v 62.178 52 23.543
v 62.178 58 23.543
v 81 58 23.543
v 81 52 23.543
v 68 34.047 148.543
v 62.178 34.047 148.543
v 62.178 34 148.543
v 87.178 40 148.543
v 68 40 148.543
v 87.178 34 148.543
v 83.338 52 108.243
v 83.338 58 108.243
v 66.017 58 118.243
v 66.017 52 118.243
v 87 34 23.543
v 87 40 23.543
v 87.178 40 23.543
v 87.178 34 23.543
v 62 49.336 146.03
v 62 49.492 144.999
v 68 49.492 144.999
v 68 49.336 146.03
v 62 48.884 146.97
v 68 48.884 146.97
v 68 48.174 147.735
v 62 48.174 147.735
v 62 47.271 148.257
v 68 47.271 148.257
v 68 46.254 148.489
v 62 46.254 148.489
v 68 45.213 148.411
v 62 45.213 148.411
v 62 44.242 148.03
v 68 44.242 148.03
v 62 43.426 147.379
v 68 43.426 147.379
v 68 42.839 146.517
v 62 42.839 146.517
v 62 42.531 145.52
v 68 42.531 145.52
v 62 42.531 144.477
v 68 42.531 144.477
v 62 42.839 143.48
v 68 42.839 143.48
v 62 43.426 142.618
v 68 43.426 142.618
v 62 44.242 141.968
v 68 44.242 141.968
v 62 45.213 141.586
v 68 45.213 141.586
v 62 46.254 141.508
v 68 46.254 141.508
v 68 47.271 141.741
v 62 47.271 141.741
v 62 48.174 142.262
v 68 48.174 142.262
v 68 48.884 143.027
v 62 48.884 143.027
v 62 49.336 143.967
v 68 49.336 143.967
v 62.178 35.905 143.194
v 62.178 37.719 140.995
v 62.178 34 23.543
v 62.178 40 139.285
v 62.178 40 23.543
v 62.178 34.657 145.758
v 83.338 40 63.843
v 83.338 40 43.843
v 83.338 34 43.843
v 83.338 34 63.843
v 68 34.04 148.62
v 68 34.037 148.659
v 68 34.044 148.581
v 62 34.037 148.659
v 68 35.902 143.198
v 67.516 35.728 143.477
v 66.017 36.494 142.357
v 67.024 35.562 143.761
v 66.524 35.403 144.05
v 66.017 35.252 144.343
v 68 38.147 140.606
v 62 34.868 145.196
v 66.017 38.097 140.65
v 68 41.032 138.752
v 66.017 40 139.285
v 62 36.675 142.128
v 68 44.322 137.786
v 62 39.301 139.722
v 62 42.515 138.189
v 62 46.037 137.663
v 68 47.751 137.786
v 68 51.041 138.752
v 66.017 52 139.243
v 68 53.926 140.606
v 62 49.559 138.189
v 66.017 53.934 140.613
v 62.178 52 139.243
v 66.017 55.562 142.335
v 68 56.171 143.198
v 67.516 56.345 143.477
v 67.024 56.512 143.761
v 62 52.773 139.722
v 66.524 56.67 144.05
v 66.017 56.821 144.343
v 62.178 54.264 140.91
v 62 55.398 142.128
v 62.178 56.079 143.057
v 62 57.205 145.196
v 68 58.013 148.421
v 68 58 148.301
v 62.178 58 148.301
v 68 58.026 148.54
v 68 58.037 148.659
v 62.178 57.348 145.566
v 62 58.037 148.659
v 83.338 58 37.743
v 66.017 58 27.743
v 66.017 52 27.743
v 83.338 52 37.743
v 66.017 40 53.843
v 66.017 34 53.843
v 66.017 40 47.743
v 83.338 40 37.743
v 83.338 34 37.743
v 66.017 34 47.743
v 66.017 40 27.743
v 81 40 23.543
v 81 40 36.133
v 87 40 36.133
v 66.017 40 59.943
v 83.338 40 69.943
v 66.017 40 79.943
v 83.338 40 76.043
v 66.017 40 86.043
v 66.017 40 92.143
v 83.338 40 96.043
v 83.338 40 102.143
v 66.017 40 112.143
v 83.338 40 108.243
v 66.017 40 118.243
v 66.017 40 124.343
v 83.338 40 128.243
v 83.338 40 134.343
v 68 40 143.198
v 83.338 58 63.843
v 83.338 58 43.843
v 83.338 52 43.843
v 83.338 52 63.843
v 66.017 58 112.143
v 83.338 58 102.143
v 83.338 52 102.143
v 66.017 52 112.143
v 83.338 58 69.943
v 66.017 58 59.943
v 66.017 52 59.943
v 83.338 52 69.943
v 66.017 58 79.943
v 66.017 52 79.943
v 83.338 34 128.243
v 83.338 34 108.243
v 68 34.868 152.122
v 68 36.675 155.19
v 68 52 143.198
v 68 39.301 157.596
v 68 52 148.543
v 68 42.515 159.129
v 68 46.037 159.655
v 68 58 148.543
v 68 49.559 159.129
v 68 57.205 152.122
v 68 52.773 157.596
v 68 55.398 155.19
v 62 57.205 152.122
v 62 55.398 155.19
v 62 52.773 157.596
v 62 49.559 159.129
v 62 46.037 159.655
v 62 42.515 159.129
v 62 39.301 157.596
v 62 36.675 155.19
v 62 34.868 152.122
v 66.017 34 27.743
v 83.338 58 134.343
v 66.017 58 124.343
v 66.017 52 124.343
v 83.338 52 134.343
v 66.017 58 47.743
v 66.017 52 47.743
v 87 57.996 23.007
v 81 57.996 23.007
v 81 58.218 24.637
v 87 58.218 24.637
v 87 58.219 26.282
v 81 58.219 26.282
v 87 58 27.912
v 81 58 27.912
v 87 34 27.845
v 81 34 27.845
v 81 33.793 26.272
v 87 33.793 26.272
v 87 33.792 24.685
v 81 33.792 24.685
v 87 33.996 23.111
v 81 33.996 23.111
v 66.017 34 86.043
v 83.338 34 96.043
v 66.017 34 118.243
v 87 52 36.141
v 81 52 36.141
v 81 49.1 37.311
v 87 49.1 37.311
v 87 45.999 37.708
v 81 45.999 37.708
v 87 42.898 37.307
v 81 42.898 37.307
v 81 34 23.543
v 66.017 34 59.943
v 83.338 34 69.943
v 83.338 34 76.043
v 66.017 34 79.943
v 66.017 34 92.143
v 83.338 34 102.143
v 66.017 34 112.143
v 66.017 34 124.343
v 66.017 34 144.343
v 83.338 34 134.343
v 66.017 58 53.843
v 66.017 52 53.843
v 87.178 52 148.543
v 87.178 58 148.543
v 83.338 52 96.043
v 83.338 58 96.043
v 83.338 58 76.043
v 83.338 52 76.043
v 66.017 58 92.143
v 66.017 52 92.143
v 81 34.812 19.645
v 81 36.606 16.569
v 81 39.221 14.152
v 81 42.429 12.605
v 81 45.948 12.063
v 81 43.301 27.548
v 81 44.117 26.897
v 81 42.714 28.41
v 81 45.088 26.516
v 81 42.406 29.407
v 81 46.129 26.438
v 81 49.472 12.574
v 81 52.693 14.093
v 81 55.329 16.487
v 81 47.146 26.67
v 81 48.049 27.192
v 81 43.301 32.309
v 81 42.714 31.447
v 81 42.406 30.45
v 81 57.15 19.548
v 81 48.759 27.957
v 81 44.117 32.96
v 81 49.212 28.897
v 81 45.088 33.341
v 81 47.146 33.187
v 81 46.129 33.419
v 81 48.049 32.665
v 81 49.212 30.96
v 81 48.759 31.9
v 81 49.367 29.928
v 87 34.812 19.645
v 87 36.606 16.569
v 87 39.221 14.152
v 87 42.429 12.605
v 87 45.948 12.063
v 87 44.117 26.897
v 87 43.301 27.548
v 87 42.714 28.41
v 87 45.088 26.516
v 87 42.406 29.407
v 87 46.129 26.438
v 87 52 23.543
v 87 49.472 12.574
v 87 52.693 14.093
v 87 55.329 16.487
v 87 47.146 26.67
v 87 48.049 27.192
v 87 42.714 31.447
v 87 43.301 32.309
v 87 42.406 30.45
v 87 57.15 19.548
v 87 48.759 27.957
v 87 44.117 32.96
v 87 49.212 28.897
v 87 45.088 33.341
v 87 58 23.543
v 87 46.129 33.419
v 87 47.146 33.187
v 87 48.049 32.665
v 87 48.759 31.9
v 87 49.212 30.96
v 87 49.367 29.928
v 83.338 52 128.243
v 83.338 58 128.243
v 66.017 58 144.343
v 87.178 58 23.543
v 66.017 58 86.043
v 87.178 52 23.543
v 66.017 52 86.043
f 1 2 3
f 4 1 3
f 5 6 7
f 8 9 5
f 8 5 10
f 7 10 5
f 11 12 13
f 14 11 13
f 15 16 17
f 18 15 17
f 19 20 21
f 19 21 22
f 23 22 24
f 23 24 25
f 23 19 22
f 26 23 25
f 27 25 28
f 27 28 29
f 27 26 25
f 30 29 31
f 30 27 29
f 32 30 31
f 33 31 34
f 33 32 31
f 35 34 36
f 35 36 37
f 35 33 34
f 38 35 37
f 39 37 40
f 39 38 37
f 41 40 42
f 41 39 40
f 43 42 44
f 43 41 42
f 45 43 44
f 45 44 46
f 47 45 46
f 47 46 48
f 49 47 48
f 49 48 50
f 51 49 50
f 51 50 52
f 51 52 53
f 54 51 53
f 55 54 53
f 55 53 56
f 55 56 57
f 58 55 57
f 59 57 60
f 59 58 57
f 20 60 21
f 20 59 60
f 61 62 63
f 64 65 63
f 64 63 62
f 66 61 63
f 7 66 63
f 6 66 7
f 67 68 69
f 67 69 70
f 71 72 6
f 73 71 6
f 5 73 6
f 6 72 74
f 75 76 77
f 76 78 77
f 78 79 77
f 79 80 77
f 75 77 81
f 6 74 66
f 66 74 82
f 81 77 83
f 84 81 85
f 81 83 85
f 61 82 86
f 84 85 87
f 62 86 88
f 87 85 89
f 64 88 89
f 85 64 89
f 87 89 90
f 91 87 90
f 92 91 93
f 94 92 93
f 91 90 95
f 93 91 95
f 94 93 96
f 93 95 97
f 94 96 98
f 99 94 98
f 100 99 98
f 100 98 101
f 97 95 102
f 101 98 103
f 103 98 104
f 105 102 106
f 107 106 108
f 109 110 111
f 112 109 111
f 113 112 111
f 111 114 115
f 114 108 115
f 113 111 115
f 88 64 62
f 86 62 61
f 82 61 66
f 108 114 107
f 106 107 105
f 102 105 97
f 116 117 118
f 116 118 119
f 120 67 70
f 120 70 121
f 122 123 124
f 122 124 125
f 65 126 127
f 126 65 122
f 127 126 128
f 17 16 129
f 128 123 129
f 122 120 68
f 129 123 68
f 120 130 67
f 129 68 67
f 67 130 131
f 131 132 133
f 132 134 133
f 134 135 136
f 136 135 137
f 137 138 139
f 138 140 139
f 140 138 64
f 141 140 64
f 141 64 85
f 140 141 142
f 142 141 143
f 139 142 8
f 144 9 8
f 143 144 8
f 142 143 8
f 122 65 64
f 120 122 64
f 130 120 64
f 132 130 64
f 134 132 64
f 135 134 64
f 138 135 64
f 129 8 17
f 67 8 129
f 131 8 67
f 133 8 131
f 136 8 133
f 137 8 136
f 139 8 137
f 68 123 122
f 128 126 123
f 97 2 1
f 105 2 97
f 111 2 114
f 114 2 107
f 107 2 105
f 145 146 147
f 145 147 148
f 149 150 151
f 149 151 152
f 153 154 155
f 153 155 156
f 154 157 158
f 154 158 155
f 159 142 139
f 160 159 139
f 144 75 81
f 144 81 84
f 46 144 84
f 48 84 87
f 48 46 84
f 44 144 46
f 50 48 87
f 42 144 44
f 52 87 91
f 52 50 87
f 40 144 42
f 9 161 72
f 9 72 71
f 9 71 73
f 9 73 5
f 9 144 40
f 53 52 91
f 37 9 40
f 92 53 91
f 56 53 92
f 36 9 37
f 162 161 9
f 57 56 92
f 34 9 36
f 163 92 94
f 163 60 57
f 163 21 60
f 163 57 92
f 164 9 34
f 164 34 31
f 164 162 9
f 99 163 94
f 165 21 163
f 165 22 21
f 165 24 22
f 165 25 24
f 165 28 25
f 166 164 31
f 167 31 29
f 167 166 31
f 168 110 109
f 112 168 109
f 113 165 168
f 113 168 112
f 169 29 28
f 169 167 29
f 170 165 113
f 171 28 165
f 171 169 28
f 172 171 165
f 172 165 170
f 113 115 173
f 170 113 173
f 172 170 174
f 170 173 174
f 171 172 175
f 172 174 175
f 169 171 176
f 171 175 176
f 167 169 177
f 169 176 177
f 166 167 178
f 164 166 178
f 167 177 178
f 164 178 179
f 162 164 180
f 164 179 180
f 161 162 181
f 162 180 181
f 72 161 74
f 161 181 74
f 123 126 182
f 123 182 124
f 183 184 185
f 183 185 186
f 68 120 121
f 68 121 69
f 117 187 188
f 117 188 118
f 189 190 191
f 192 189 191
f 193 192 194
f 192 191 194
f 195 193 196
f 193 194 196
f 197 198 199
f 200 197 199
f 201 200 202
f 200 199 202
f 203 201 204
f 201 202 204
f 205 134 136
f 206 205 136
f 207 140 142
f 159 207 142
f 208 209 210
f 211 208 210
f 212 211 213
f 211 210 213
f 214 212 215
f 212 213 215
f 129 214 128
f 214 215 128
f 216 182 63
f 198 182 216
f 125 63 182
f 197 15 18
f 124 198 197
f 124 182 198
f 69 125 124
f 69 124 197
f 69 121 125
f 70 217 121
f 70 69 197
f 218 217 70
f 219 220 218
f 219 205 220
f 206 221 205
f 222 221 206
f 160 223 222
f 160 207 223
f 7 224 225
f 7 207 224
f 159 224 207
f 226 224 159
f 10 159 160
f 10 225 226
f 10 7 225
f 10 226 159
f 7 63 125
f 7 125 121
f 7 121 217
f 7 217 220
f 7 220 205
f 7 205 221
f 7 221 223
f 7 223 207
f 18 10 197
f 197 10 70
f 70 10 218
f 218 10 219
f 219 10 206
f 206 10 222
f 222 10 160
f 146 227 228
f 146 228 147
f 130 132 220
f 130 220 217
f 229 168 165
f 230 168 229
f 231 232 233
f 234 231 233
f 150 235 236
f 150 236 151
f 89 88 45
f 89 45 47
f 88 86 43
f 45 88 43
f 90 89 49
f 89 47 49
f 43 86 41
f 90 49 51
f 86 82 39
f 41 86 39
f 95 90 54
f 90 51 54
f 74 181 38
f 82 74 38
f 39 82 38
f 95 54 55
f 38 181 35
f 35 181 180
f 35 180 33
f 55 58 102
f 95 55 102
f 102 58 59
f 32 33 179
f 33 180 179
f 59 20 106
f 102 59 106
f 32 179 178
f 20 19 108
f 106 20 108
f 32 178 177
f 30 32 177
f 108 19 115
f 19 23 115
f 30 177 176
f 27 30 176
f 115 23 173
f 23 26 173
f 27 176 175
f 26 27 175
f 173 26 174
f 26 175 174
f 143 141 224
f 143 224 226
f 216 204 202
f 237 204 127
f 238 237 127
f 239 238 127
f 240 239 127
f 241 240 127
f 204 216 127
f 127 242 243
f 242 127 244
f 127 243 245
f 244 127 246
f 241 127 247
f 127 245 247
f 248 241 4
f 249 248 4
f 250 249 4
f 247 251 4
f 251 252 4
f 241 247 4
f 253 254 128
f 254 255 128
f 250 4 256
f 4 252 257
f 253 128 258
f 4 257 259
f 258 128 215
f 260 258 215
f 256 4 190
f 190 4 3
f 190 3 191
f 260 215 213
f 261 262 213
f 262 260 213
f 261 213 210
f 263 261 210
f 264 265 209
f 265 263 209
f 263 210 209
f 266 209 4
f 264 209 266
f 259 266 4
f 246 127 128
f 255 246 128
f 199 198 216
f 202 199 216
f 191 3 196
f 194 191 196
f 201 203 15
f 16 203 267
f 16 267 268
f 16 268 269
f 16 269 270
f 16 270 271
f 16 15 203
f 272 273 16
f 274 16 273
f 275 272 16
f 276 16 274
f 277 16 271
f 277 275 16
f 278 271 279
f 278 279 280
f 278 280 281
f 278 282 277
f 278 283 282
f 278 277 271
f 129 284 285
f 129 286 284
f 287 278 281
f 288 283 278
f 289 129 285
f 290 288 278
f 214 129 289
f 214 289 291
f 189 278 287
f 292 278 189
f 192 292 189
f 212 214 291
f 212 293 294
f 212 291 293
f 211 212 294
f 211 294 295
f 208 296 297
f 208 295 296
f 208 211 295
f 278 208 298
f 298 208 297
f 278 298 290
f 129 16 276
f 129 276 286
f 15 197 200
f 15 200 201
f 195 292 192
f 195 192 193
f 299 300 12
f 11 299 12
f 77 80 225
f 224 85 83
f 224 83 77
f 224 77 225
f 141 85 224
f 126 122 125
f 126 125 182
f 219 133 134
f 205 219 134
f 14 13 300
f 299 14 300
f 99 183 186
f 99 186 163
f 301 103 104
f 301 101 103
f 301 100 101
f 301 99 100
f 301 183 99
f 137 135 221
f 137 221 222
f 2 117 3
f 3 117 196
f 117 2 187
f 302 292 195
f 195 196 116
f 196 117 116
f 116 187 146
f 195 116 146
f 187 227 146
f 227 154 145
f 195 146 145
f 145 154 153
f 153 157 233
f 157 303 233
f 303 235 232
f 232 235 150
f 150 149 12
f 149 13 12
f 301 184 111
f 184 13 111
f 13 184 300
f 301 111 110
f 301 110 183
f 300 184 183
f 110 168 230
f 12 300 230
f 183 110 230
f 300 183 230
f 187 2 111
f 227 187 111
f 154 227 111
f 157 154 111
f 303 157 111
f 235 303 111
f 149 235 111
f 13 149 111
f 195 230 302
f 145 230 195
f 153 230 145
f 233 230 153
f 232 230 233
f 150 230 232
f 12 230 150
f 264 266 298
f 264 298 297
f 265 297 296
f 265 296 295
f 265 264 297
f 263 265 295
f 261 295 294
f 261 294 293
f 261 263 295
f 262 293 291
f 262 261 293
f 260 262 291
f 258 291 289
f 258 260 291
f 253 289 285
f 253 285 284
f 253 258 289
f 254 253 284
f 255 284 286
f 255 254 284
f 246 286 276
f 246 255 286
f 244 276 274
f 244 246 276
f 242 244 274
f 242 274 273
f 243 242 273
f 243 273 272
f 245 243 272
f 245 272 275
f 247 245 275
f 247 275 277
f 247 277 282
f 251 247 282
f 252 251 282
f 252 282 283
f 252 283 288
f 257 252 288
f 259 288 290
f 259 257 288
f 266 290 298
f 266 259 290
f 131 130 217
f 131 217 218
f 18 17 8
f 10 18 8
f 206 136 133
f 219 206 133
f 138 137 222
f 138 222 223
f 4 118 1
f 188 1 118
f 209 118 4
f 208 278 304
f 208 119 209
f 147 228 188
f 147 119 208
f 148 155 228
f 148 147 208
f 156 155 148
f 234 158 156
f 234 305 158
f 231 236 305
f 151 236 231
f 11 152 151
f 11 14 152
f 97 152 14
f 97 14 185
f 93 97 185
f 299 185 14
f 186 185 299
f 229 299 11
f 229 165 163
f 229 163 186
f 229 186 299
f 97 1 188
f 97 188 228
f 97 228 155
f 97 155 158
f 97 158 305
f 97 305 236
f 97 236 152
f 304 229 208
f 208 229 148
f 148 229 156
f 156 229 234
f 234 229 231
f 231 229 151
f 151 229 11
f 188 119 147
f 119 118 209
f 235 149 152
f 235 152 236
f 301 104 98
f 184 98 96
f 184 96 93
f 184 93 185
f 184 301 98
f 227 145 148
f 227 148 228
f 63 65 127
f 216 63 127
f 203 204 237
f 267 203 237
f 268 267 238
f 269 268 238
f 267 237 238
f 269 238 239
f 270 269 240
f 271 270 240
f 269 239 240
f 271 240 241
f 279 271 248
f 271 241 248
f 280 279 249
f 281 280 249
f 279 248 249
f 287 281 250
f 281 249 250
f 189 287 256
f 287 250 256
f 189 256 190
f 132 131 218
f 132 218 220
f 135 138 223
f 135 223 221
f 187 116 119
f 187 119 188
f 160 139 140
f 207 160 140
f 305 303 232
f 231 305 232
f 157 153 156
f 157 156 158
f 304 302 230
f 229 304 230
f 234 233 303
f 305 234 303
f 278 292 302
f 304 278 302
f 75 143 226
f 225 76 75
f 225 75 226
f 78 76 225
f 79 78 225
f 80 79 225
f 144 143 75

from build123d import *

# Parameters (mm, degrees)
SKETCH019_R      = 3.5
EXTRUDE018_DEPTH = 6
SKETCH018_W      = 25
SKETCH018_H      = 125
EXTRUDE017_DEPTH = 6
SKETCH020_R      = 3.5
EXTRUDE019_DEPTH = 6


with BuildPart() as union_parte_arriba:
    # Sketch019 → Extrude018 (new body)
    with BuildSketch(Plane.YZ):
        with BuildLine():
            ThreePointArc((82.036674, 148.659016), (70.036674, 159.65499), (58.036674, 148.659016))
            ThreePointArc((58.036674, 148.659016), (70.036674, 137.663042), (82.036674, 148.659016))
        make_face()
        with Locations((69.991982, 144.998688)):
            Circle(SKETCH019_R, mode=Mode.SUBTRACT)
    extrude(amount=EXTRUDE018_DEPTH)


with BuildPart() as union_parte_arriba_1:
    # Extrude018 placement: moved
    add(union_parte_arriba.part.moved(Location((72, 0, 0))))


with BuildPart() as palo_triangular:
    # Sketch018 → Extrude017 (new body)
    with BuildSketch(Plane.XZ):
        with Locations((84.677579, 86.042568)):
            Rectangle(SKETCH018_W, SKETCH018_H)
        Polygon((76.017071, 47.742568), (76.017071, 27.742568), (93.337579, 37.742568), align=None, mode=Mode.SUBTRACT)
        Polygon((76.017071, 53.842568), (93.337579, 43.842568), (93.337579, 63.842568), align=None, mode=Mode.SUBTRACT)
        Polygon((76.017071, 79.942568), (76.017071, 59.942568), (93.337579, 69.942568), align=None, mode=Mode.SUBTRACT)
        Polygon((76.017071, 112.142568), (76.017071, 92.142568), (93.337579, 102.142568), align=None, mode=Mode.SUBTRACT)
        Polygon((76.017071, 144.342568), (76.017071, 124.342568), (93.337579, 134.342568), align=None, mode=Mode.SUBTRACT)
        Polygon((76.017071, 86.042568), (93.337579, 96.042568), (93.337579, 76.042568), align=None, mode=Mode.SUBTRACT)
        Polygon((76.017071, 118.242568), (93.337579, 128.242568), (93.337579, 108.242568), align=None, mode=Mode.SUBTRACT)
    extrude(amount=EXTRUDE017_DEPTH)


with BuildPart() as palo_triangular_1:
    # Extrude017 placement: moved
    add(palo_triangular.part.moved(Location((0, 64, 0))))


with BuildPart() as palo_triangular001:
    # Link019 base: copy of Palo triangular
    add(palo_triangular_1.part)


with BuildPart() as palo_triangular001_1:
    # Link019 placement: moved
    add(palo_triangular001.part.moved(Location((0, 18.000008, 0))))


with BuildPart() as palito_2_codo_v2:
    # Sketch020 → Extrude019 (new body)
    with BuildSketch(Plane.YZ):
        with BuildLine():
            ThreePointArc((57.996231, 23.111303), (69.948323, 12.063047), (81.996231, 23.006739))
            ThreePointArc((81.996231, 23.006739), (70.060056, 37.708327), (57.996231, 23.111303))
        make_face()
        with Locations((69.867134, 29.92848)):
            Circle(SKETCH020_R, mode=Mode.SUBTRACT)
    extrude(amount=EXTRUDE019_DEPTH)


with BuildPart() as palito_2_codo_v2_1:
    # Extrude019 placement: moved
    add(palito_2_codo_v2.part.moved(Location((91, 0, 0))))

    # Fusion023: union union parte arriba, Palo triangular001, Palo triangular
    add(union_parte_arriba_1.part)
    add(palo_triangular001_1.part)
    add(palo_triangular_1.part)


with BuildPart() as palito_2_codo_v2_2:
    # Fusion023 placement: moved
    add(palito_2_codo_v2_1.part.moved(Location((-10, -24, 0))))


solid = palito_2_codo_v2_2.part
